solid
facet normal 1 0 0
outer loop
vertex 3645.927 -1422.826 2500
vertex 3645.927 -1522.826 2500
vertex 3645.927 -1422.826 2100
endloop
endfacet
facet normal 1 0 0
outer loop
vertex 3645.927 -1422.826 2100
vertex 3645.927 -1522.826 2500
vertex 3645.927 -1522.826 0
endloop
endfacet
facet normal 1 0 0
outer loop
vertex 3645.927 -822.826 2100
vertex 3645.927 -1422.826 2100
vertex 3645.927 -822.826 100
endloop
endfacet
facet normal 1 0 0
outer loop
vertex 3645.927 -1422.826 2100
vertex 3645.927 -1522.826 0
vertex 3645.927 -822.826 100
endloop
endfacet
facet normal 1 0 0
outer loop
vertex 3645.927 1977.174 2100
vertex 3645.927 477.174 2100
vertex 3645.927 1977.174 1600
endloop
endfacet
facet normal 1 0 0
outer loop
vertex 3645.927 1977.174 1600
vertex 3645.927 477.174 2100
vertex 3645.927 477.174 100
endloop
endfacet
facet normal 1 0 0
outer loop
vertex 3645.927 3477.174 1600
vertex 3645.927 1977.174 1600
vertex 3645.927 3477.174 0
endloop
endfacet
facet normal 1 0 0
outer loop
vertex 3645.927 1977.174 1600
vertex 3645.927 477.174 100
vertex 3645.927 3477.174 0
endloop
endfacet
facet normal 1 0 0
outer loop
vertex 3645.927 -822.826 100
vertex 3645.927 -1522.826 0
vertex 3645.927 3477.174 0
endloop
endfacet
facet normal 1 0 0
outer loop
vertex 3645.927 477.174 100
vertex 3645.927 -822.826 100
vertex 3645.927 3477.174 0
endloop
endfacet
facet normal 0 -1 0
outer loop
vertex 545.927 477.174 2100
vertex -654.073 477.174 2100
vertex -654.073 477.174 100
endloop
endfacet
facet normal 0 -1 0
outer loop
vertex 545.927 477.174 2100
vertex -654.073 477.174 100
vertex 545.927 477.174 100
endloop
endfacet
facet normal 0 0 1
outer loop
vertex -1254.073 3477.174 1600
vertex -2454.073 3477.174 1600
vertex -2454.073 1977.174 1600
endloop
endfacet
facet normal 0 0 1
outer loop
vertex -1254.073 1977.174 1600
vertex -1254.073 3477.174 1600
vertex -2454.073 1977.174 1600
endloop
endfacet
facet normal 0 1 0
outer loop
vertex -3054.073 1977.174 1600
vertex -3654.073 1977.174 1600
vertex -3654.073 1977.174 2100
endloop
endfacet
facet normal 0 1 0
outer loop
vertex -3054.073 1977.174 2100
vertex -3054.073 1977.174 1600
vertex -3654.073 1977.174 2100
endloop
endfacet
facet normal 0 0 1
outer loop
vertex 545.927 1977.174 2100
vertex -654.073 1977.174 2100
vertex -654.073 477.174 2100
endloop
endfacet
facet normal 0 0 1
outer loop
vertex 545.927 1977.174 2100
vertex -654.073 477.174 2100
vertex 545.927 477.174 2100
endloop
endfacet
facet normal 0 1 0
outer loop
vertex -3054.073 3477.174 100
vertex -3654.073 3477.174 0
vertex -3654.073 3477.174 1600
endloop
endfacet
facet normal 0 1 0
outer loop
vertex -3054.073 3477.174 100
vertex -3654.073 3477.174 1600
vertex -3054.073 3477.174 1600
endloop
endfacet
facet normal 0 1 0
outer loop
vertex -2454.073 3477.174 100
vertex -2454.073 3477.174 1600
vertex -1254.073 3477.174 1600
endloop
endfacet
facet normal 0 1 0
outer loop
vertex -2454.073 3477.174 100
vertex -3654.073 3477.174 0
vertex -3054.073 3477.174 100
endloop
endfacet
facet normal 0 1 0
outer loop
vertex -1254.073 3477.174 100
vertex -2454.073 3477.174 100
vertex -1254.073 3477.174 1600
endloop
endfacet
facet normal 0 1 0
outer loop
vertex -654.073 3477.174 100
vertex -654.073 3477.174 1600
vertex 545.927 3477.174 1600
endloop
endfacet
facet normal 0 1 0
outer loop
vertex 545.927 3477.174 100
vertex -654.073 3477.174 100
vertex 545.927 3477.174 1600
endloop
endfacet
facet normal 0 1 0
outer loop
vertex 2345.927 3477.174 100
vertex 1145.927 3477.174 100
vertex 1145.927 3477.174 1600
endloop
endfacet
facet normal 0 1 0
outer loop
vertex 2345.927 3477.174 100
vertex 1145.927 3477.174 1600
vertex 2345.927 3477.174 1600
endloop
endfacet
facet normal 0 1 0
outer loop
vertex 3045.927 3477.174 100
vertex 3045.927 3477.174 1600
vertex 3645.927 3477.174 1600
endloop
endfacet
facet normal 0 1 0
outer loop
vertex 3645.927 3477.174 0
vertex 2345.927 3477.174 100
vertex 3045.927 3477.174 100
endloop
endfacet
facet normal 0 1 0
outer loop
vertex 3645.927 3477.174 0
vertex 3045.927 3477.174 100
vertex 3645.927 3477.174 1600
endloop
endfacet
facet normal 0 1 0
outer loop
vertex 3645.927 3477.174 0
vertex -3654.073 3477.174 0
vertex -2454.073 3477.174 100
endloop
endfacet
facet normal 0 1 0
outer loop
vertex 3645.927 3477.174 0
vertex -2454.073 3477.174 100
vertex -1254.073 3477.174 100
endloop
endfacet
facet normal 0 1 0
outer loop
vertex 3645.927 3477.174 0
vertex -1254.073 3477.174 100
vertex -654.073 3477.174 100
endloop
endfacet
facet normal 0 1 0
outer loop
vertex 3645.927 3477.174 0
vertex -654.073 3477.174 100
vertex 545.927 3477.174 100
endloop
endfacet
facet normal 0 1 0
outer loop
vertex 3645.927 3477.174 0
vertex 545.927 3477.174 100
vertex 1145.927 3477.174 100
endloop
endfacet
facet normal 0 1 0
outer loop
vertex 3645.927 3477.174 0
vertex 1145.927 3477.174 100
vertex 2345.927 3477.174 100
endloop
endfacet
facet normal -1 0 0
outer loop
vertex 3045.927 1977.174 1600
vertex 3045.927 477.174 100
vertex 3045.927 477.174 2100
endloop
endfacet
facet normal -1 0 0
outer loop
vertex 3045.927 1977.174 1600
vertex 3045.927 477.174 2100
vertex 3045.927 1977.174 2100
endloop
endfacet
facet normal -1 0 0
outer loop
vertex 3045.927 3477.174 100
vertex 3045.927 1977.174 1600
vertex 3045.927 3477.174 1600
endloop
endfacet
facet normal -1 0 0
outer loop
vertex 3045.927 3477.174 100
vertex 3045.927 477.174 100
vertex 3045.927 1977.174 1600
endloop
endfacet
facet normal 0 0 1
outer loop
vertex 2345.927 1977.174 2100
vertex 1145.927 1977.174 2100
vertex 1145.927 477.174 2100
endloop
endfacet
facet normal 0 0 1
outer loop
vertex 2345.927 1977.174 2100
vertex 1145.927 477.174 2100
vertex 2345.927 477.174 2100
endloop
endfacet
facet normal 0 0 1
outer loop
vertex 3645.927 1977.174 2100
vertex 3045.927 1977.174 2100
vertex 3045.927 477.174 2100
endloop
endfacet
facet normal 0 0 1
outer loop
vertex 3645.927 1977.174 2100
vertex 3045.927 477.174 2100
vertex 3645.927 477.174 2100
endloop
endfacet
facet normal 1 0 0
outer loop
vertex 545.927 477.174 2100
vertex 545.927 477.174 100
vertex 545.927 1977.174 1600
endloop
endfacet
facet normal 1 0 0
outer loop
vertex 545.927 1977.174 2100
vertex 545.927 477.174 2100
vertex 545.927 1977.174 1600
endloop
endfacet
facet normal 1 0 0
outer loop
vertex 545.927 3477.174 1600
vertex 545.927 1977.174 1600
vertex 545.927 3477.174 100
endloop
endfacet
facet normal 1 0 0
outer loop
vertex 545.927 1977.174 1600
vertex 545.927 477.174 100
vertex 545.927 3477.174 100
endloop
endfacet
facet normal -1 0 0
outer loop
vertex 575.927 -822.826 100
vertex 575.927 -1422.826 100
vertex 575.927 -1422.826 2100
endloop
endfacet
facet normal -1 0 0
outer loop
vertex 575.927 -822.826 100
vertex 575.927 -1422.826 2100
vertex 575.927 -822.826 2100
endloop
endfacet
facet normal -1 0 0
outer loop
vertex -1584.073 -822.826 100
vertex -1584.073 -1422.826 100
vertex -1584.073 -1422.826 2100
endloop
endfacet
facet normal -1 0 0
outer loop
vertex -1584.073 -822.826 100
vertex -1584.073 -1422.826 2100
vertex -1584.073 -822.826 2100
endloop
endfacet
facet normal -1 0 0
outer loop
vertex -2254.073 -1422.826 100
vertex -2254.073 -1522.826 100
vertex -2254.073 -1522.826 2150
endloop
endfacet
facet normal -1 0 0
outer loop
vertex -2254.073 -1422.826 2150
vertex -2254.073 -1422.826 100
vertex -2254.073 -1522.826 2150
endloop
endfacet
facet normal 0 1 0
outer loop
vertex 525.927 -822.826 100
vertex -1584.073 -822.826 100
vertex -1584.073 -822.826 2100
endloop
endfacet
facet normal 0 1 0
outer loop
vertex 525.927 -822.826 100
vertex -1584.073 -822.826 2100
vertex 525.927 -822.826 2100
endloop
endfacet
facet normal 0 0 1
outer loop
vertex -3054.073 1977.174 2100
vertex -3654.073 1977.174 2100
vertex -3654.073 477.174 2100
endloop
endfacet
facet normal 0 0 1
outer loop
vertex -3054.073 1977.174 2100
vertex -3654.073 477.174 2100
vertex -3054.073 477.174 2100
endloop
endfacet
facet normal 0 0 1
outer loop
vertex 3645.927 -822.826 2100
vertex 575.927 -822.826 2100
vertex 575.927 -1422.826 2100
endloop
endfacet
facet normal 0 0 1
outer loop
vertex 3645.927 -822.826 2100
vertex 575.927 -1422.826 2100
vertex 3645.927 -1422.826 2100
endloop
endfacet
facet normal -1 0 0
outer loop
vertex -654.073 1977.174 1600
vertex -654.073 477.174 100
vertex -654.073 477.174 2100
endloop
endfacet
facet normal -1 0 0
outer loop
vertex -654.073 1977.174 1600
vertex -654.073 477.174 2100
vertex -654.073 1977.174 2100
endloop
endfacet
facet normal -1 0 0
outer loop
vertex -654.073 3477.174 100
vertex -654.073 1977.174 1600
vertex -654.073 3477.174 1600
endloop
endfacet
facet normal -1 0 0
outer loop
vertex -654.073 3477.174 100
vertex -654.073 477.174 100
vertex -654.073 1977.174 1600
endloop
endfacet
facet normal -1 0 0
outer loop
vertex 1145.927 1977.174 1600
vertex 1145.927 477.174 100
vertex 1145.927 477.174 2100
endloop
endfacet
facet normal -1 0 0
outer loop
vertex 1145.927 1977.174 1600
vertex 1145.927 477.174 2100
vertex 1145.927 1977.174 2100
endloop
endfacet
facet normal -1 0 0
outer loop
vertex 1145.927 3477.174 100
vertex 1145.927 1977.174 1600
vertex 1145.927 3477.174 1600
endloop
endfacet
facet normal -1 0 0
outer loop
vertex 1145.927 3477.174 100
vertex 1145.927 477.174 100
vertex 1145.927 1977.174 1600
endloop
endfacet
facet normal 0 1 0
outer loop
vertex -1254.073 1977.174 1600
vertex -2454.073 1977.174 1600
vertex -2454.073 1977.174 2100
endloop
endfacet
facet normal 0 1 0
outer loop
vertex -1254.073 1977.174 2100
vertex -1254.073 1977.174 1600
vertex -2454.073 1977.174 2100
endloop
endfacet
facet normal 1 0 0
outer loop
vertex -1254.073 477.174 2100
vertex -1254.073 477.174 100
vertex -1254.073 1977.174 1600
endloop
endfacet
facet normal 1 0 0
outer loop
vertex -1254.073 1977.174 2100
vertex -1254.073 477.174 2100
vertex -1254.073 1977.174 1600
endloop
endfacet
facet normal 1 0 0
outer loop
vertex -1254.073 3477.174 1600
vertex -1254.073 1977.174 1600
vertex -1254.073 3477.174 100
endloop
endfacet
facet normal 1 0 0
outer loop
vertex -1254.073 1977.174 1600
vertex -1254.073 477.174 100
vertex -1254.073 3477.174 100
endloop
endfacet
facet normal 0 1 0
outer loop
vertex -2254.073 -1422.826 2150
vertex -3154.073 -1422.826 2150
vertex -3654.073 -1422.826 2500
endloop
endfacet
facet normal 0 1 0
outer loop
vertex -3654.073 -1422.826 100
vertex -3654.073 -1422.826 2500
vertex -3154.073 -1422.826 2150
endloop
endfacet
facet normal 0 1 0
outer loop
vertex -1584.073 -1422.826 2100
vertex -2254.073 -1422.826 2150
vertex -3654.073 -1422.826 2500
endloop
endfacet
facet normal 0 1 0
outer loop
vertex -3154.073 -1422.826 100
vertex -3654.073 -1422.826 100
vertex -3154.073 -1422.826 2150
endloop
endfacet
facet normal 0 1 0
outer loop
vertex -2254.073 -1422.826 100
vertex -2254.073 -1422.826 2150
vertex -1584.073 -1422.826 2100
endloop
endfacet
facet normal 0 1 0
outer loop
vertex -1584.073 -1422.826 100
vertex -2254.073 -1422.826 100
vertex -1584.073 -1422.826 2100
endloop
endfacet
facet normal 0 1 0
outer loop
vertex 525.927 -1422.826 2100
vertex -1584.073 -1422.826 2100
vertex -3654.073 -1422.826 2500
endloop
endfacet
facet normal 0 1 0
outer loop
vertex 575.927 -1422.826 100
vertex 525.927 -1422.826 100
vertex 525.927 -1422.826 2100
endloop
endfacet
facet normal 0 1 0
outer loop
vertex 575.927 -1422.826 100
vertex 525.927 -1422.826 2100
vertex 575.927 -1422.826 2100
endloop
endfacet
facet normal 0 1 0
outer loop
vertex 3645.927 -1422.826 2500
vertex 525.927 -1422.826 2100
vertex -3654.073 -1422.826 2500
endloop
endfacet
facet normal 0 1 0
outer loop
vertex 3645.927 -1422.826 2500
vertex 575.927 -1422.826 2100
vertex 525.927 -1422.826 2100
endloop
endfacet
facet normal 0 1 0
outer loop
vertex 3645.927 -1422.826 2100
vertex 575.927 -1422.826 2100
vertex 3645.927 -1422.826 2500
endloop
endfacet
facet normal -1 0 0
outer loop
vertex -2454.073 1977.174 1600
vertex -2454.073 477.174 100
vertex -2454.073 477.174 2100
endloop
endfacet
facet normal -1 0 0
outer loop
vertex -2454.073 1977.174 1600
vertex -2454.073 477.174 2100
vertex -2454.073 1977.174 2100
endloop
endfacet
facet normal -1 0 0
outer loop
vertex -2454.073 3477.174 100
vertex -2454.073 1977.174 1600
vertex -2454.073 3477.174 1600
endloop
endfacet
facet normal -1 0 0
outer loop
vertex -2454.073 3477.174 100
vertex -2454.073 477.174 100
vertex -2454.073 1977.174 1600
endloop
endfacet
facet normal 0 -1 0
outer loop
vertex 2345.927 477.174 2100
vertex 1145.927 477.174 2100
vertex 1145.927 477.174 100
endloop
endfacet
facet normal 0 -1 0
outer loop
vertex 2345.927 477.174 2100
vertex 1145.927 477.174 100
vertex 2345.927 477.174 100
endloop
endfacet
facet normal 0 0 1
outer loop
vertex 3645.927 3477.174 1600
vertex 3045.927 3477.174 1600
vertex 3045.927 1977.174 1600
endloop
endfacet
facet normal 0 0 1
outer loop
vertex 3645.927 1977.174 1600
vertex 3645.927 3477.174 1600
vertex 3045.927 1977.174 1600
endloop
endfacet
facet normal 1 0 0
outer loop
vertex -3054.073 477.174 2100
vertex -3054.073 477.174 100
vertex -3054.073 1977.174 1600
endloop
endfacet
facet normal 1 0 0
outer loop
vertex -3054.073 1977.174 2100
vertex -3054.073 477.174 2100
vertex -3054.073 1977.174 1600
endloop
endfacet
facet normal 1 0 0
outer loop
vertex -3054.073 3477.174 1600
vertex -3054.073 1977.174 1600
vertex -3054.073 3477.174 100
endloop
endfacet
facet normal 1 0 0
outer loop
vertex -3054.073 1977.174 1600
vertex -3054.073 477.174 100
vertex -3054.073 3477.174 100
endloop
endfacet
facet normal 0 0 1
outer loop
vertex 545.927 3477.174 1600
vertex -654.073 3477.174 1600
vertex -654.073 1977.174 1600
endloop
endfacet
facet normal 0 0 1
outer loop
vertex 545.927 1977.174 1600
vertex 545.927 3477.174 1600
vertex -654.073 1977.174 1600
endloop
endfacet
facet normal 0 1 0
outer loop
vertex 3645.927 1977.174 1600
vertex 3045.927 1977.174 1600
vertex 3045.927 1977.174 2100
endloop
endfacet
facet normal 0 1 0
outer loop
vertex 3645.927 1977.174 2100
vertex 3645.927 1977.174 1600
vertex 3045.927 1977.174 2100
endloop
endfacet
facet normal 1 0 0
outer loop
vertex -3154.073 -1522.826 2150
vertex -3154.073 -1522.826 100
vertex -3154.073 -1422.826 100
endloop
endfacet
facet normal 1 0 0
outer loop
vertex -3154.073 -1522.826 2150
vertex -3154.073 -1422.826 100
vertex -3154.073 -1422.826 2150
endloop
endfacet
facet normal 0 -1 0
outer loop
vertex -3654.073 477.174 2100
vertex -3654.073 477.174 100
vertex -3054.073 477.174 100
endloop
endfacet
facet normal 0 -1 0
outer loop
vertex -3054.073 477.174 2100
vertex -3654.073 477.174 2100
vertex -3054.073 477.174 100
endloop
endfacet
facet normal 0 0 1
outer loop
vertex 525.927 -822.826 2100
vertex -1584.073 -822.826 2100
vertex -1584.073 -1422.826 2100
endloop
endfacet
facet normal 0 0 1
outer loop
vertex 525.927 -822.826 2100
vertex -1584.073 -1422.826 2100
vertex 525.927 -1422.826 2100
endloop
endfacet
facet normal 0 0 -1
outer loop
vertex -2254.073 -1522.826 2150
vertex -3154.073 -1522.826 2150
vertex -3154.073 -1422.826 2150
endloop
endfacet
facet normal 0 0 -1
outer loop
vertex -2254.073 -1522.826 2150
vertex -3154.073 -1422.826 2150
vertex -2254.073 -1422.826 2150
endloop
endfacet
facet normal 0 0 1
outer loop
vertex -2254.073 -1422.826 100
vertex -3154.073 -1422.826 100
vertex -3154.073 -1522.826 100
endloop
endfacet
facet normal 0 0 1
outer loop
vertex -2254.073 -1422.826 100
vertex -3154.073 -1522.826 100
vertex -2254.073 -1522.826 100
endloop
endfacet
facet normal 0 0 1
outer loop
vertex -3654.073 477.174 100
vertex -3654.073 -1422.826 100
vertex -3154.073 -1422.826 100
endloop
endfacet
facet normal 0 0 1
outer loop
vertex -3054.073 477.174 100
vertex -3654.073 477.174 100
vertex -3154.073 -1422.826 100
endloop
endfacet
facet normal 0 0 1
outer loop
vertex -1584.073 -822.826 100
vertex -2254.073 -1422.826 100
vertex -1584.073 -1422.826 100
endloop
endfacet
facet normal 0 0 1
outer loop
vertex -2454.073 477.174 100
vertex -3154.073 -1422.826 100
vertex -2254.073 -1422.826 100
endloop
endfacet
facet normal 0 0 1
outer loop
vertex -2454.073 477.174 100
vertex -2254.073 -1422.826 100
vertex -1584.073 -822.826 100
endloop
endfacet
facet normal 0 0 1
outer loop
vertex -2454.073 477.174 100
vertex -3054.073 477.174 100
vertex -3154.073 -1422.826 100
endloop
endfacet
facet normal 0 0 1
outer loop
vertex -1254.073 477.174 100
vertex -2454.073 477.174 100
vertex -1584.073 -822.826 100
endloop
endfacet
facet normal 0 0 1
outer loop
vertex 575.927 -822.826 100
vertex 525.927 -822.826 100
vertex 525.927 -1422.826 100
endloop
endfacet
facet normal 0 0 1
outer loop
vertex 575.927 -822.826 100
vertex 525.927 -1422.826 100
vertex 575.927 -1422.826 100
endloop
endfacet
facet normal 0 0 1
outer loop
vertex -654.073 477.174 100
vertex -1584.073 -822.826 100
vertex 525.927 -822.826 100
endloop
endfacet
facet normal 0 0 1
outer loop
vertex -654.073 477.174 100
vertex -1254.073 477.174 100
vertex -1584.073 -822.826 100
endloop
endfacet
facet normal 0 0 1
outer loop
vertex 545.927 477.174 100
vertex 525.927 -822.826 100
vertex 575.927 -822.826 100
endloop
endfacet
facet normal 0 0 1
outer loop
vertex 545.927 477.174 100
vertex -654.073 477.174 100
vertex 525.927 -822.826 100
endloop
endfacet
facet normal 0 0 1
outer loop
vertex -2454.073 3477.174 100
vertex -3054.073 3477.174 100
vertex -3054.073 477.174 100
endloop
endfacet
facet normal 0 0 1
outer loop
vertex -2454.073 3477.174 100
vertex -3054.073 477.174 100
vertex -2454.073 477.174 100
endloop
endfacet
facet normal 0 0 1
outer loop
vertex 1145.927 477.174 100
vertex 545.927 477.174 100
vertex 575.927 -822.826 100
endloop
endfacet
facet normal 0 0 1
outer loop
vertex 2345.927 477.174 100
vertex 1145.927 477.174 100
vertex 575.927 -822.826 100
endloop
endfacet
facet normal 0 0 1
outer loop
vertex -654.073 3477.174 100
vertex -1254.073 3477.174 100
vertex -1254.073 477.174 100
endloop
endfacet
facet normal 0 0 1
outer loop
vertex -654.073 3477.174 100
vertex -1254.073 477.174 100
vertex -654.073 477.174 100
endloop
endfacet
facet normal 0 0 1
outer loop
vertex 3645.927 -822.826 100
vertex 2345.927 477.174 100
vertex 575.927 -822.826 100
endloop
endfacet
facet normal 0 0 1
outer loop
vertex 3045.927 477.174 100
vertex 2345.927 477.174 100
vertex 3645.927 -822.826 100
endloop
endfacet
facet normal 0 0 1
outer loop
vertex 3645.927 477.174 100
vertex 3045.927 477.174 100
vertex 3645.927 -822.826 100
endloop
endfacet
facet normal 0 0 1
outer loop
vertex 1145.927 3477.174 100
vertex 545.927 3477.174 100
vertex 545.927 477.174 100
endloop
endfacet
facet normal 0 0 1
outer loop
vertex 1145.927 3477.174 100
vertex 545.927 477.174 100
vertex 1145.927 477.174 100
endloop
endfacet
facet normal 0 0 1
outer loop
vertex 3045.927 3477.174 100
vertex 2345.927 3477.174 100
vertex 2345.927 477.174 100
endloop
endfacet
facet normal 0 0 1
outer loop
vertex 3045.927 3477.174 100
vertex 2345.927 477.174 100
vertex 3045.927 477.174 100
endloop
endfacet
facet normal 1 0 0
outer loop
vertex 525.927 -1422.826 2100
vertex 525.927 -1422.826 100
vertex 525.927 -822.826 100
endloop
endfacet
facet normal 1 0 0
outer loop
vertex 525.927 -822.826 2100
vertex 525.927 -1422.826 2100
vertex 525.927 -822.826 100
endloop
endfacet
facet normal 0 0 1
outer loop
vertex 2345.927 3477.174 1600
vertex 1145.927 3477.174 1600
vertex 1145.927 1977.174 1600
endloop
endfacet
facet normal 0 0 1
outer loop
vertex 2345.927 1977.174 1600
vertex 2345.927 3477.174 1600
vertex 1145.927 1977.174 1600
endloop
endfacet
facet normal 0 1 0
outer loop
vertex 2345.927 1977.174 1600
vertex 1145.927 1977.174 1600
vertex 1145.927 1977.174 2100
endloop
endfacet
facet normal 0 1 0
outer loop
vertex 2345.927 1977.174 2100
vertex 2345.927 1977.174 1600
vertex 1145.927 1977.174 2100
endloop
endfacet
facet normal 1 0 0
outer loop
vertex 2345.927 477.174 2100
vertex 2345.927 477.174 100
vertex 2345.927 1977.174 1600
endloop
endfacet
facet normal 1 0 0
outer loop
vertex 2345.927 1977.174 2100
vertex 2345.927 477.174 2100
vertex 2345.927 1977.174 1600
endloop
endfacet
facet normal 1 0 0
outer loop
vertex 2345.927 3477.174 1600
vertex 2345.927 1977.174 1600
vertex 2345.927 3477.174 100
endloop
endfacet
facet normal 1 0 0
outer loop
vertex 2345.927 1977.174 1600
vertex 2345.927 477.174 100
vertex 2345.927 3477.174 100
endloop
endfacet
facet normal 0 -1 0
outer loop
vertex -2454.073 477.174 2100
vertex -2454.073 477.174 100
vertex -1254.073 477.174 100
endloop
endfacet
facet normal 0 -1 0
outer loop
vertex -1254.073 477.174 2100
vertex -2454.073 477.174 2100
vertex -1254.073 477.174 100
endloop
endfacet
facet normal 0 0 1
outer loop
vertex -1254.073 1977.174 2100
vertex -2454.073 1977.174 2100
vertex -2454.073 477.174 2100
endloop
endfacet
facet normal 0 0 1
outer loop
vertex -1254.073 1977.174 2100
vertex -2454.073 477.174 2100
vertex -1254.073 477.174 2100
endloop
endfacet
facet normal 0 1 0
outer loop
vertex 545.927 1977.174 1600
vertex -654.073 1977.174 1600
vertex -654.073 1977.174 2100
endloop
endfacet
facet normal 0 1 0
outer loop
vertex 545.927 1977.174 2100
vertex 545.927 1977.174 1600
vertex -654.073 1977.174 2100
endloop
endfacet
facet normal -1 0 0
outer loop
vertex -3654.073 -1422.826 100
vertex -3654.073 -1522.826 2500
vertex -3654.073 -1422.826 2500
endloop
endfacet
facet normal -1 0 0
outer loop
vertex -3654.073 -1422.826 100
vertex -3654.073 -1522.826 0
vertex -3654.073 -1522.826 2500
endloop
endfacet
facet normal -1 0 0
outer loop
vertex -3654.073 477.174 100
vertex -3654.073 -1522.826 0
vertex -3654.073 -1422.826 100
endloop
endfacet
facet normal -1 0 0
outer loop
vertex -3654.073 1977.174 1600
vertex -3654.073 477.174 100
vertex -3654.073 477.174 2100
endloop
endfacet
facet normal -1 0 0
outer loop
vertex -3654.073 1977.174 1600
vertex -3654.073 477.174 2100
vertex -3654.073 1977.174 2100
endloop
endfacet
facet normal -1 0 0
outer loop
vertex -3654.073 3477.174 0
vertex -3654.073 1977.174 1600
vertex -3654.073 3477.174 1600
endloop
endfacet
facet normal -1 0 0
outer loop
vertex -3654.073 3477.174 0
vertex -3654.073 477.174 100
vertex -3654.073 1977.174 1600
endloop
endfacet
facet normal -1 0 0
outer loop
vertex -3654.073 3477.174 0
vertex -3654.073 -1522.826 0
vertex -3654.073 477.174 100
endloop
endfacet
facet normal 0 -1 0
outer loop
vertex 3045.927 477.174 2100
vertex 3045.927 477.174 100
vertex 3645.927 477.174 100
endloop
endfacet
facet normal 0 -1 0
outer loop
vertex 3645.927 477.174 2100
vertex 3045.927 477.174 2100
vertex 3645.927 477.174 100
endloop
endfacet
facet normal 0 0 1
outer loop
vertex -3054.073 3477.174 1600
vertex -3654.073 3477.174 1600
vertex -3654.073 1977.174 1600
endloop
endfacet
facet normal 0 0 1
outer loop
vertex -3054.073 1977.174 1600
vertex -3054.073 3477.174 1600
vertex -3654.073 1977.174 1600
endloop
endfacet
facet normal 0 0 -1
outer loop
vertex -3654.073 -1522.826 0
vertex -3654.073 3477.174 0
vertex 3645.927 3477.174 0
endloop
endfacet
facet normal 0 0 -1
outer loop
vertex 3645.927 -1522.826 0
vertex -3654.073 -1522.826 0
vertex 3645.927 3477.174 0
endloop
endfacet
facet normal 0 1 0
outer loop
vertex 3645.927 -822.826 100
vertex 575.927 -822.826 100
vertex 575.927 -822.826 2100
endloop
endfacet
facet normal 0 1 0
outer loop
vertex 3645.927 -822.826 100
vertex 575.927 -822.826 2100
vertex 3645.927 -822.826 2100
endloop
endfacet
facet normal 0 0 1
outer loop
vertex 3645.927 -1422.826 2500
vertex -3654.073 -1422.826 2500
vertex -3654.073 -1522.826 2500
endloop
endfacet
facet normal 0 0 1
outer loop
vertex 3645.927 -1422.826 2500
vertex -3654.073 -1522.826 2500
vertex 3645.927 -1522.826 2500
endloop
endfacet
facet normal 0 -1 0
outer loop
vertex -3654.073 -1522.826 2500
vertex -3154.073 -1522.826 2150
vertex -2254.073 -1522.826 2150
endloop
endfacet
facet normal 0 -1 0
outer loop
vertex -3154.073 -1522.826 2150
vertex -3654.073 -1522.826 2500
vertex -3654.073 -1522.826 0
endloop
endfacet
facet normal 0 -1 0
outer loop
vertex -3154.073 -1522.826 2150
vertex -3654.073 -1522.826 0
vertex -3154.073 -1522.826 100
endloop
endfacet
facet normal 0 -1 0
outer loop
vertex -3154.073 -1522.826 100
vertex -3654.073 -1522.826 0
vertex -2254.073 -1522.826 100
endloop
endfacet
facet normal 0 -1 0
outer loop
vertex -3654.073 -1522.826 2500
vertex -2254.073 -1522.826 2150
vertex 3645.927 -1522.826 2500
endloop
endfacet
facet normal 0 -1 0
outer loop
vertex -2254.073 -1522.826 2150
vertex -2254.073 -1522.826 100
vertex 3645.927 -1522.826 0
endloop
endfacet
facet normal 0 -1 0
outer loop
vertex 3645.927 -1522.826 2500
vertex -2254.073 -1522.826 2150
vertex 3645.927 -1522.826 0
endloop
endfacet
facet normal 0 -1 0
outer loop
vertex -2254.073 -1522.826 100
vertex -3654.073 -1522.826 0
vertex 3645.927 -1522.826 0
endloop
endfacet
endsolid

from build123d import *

# Parameters (mm, degrees)
F0_W      = 7300
F0_H      = 5000
F1_DEPTH  = 100
F2_W      = 600
F2_H      = 3000
F2_W_2    = 1200
F3_DEPTH  = 2000
F4_W      = 1500
F4_H      = 500
F5_DEPTH  = 8000
F6_W      = 7300
F6_H      = 100
F7_DEPTH  = 2400
F8_W      = 900
F8_H      = 2050
F9_DEPTH  = 100
F10_W     = 3070
F10_H     = 600
F11_W     = 2110
F11_H     = 600
F12_DEPTH = 2000


with BuildPart() as f1:
    # F0 (on Top) → F1 (new body)
    with BuildSketch(Plane.XY):
        with Locations((-4.0733702481, 977.1735011828)):
            Rectangle(F0_W, F0_H)
    extrude(amount=F1_DEPTH)

    # F2 (on face) → F3 (join)
    with BuildSketch(Plane.XY.offset(100)):
        with Locations((-3354.0733702481, 1977.1735011828)):
            Rectangle(F2_W, F2_H)
        with Locations((-1854.0733702481, 1977.1735011828)):
            Rectangle(F2_W_2, F2_H)
        with Locations((-54.0733702481, 1977.1735011828)):
            Rectangle(F2_W_2, F2_H)
        with Locations((1745.9266297519, 1977.1735011828)):
            Rectangle(F2_W_2, F2_H)
        with Locations((3345.9266297519, 1977.1735011828)):
            Rectangle(F2_W, F2_H)
    extrude(amount=F3_DEPTH)

    # F4 (on face) → F5 (cut)
    with BuildSketch(Plane(origin=(-3654.0733702481, 0, 0), x_dir=(0, -1, 0), z_dir=(-1, 0, 0))):
        with Locations((-2727.1735011828, 1850)):
            Rectangle(F4_W, F4_H)
    extrude(amount=-F5_DEPTH, mode=Mode.SUBTRACT)

    # F6 (on face) → F7 (join)
    with BuildSketch(Plane.XY.offset(100)):
        with Locations((-4.0733702481, -1472.8264988172)):
            Rectangle(F6_W, F6_H)
    extrude(amount=F7_DEPTH)

    # F8 (on face) → F9 (cut)
    with BuildSketch(Plane.XZ.offset(1522.8264988172)):
        with Locations((-2704.0733702481, 1125)):
            Rectangle(F8_W, F8_H)
    extrude(amount=-F9_DEPTH, mode=Mode.SUBTRACT)

    # F10 (on face) + F11 (on face) → F12 (join)
    with BuildSketch(Plane.XY.offset(100)):
        with Locations((2110.9266297519, -1122.8264988172)):
            Rectangle(F10_W, F10_H)
    with BuildSketch(Plane.XY.offset(100)):
        with Locations((-529.0733702481, -1122.8264988172)):
            Rectangle(F11_W, F11_H)
    extrude(amount=F12_DEPTH)


solid = f1.part
